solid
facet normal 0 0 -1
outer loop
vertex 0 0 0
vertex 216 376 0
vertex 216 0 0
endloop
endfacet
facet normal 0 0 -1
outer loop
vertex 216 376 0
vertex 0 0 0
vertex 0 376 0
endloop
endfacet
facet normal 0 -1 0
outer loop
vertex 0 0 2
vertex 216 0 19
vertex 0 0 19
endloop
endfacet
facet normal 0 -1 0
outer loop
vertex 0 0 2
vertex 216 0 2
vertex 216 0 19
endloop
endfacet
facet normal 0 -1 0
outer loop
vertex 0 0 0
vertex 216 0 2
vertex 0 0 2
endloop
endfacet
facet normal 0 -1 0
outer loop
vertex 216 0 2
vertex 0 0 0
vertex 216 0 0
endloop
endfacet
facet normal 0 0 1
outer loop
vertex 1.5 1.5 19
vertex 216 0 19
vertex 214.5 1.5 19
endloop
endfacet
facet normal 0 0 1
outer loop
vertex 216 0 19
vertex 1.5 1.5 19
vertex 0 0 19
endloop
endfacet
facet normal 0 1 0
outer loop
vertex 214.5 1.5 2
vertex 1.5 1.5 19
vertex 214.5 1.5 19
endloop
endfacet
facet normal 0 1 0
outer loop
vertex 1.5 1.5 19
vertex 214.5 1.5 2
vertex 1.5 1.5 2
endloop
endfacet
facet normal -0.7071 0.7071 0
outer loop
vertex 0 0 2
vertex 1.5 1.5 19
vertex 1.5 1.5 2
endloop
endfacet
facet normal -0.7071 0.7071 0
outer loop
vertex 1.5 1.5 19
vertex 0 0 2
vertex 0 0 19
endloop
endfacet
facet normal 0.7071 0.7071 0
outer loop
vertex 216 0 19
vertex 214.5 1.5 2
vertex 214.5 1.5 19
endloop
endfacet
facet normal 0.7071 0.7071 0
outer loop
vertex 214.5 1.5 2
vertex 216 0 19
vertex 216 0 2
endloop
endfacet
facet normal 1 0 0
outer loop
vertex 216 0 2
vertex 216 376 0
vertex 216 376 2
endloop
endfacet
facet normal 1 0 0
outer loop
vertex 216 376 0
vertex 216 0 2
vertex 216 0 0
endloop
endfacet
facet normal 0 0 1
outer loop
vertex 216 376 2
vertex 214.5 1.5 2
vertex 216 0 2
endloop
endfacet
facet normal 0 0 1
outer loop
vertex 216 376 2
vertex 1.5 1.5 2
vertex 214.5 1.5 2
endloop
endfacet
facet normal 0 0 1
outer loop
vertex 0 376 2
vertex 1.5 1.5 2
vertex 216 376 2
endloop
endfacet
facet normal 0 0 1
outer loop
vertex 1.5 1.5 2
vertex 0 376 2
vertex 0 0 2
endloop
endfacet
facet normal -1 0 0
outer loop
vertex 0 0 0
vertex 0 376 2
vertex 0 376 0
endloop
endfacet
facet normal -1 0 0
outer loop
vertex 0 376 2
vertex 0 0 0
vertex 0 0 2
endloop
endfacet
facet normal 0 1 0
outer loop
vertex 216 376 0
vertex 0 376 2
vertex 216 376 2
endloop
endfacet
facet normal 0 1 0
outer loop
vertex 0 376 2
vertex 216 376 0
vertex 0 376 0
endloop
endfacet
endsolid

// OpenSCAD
leds_x = 216;
leds_y = 376;
screen_x = 332;
screen_y = 420;


// generates aluminum L stock <length> along the X axis
module lstock(length) {
	cube([length, 19, 1.5]);
	cube([length, 1.5, 19]);
}

module leds() {
	cube([leds_x, leds_y, 2]);
	difference() {
		lstock(leds_x);
		# translate([-1, -1, -1]) rotate(45, [0, 0, 1]) cube([30, 30, 30]);
		 #translate([leds_x, 0, -1]) rotate(45, [0, 0, 1]) cube([30, 30, 30]);
	}
}

leds();
